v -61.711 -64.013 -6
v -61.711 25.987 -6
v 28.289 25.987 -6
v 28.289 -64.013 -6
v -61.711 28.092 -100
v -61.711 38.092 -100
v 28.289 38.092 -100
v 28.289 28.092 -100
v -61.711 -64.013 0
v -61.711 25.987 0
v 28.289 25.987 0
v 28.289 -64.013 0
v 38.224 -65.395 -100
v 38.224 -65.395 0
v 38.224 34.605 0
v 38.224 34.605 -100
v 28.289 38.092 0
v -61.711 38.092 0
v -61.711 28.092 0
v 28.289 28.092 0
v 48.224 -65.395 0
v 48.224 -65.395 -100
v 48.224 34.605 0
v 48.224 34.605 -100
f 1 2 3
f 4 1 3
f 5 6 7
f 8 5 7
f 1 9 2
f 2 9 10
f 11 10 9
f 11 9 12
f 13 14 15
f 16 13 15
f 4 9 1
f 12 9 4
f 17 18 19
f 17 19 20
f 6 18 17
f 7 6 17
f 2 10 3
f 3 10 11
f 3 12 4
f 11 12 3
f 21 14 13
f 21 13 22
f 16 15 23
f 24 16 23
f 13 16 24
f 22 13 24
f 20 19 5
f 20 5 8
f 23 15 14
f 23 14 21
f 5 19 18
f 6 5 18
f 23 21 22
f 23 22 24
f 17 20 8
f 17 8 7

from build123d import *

# Parameters (mm, degrees)
F0_W     = 90
F0_H     = 90
F1_DEPTH = 6
F2_W     = 10
F2_H     = 100
F3_DEPTH = 100
F4_W     = 90
F4_H     = 10
F5_DEPTH = 100


with BuildPart() as f1:
    # F0 (on Top) → F1 (new body)
    with BuildSketch(Plane.XY):
        with Locations((-16.710529, -19.013161)):
            Rectangle(F0_W, F0_H)
    extrude(amount=-F1_DEPTH)


with BuildPart() as f3:
    # F2 (on Top) → F3 (new body)
    with BuildSketch(Plane.XY):
        with Locations((43.223684, -15.394737)):
            Rectangle(F2_W, F2_H)
    extrude(amount=-F3_DEPTH)


with BuildPart() as f5:
    # F4 (on Top) → F5 (new body)
    with BuildSketch(Plane.XY):
        with Locations((-16.710529, 33.092107)):
            Rectangle(F4_W, F4_H)
    extrude(amount=-F5_DEPTH)


solid = Compound([f1.part, f3.part, f5.part])
